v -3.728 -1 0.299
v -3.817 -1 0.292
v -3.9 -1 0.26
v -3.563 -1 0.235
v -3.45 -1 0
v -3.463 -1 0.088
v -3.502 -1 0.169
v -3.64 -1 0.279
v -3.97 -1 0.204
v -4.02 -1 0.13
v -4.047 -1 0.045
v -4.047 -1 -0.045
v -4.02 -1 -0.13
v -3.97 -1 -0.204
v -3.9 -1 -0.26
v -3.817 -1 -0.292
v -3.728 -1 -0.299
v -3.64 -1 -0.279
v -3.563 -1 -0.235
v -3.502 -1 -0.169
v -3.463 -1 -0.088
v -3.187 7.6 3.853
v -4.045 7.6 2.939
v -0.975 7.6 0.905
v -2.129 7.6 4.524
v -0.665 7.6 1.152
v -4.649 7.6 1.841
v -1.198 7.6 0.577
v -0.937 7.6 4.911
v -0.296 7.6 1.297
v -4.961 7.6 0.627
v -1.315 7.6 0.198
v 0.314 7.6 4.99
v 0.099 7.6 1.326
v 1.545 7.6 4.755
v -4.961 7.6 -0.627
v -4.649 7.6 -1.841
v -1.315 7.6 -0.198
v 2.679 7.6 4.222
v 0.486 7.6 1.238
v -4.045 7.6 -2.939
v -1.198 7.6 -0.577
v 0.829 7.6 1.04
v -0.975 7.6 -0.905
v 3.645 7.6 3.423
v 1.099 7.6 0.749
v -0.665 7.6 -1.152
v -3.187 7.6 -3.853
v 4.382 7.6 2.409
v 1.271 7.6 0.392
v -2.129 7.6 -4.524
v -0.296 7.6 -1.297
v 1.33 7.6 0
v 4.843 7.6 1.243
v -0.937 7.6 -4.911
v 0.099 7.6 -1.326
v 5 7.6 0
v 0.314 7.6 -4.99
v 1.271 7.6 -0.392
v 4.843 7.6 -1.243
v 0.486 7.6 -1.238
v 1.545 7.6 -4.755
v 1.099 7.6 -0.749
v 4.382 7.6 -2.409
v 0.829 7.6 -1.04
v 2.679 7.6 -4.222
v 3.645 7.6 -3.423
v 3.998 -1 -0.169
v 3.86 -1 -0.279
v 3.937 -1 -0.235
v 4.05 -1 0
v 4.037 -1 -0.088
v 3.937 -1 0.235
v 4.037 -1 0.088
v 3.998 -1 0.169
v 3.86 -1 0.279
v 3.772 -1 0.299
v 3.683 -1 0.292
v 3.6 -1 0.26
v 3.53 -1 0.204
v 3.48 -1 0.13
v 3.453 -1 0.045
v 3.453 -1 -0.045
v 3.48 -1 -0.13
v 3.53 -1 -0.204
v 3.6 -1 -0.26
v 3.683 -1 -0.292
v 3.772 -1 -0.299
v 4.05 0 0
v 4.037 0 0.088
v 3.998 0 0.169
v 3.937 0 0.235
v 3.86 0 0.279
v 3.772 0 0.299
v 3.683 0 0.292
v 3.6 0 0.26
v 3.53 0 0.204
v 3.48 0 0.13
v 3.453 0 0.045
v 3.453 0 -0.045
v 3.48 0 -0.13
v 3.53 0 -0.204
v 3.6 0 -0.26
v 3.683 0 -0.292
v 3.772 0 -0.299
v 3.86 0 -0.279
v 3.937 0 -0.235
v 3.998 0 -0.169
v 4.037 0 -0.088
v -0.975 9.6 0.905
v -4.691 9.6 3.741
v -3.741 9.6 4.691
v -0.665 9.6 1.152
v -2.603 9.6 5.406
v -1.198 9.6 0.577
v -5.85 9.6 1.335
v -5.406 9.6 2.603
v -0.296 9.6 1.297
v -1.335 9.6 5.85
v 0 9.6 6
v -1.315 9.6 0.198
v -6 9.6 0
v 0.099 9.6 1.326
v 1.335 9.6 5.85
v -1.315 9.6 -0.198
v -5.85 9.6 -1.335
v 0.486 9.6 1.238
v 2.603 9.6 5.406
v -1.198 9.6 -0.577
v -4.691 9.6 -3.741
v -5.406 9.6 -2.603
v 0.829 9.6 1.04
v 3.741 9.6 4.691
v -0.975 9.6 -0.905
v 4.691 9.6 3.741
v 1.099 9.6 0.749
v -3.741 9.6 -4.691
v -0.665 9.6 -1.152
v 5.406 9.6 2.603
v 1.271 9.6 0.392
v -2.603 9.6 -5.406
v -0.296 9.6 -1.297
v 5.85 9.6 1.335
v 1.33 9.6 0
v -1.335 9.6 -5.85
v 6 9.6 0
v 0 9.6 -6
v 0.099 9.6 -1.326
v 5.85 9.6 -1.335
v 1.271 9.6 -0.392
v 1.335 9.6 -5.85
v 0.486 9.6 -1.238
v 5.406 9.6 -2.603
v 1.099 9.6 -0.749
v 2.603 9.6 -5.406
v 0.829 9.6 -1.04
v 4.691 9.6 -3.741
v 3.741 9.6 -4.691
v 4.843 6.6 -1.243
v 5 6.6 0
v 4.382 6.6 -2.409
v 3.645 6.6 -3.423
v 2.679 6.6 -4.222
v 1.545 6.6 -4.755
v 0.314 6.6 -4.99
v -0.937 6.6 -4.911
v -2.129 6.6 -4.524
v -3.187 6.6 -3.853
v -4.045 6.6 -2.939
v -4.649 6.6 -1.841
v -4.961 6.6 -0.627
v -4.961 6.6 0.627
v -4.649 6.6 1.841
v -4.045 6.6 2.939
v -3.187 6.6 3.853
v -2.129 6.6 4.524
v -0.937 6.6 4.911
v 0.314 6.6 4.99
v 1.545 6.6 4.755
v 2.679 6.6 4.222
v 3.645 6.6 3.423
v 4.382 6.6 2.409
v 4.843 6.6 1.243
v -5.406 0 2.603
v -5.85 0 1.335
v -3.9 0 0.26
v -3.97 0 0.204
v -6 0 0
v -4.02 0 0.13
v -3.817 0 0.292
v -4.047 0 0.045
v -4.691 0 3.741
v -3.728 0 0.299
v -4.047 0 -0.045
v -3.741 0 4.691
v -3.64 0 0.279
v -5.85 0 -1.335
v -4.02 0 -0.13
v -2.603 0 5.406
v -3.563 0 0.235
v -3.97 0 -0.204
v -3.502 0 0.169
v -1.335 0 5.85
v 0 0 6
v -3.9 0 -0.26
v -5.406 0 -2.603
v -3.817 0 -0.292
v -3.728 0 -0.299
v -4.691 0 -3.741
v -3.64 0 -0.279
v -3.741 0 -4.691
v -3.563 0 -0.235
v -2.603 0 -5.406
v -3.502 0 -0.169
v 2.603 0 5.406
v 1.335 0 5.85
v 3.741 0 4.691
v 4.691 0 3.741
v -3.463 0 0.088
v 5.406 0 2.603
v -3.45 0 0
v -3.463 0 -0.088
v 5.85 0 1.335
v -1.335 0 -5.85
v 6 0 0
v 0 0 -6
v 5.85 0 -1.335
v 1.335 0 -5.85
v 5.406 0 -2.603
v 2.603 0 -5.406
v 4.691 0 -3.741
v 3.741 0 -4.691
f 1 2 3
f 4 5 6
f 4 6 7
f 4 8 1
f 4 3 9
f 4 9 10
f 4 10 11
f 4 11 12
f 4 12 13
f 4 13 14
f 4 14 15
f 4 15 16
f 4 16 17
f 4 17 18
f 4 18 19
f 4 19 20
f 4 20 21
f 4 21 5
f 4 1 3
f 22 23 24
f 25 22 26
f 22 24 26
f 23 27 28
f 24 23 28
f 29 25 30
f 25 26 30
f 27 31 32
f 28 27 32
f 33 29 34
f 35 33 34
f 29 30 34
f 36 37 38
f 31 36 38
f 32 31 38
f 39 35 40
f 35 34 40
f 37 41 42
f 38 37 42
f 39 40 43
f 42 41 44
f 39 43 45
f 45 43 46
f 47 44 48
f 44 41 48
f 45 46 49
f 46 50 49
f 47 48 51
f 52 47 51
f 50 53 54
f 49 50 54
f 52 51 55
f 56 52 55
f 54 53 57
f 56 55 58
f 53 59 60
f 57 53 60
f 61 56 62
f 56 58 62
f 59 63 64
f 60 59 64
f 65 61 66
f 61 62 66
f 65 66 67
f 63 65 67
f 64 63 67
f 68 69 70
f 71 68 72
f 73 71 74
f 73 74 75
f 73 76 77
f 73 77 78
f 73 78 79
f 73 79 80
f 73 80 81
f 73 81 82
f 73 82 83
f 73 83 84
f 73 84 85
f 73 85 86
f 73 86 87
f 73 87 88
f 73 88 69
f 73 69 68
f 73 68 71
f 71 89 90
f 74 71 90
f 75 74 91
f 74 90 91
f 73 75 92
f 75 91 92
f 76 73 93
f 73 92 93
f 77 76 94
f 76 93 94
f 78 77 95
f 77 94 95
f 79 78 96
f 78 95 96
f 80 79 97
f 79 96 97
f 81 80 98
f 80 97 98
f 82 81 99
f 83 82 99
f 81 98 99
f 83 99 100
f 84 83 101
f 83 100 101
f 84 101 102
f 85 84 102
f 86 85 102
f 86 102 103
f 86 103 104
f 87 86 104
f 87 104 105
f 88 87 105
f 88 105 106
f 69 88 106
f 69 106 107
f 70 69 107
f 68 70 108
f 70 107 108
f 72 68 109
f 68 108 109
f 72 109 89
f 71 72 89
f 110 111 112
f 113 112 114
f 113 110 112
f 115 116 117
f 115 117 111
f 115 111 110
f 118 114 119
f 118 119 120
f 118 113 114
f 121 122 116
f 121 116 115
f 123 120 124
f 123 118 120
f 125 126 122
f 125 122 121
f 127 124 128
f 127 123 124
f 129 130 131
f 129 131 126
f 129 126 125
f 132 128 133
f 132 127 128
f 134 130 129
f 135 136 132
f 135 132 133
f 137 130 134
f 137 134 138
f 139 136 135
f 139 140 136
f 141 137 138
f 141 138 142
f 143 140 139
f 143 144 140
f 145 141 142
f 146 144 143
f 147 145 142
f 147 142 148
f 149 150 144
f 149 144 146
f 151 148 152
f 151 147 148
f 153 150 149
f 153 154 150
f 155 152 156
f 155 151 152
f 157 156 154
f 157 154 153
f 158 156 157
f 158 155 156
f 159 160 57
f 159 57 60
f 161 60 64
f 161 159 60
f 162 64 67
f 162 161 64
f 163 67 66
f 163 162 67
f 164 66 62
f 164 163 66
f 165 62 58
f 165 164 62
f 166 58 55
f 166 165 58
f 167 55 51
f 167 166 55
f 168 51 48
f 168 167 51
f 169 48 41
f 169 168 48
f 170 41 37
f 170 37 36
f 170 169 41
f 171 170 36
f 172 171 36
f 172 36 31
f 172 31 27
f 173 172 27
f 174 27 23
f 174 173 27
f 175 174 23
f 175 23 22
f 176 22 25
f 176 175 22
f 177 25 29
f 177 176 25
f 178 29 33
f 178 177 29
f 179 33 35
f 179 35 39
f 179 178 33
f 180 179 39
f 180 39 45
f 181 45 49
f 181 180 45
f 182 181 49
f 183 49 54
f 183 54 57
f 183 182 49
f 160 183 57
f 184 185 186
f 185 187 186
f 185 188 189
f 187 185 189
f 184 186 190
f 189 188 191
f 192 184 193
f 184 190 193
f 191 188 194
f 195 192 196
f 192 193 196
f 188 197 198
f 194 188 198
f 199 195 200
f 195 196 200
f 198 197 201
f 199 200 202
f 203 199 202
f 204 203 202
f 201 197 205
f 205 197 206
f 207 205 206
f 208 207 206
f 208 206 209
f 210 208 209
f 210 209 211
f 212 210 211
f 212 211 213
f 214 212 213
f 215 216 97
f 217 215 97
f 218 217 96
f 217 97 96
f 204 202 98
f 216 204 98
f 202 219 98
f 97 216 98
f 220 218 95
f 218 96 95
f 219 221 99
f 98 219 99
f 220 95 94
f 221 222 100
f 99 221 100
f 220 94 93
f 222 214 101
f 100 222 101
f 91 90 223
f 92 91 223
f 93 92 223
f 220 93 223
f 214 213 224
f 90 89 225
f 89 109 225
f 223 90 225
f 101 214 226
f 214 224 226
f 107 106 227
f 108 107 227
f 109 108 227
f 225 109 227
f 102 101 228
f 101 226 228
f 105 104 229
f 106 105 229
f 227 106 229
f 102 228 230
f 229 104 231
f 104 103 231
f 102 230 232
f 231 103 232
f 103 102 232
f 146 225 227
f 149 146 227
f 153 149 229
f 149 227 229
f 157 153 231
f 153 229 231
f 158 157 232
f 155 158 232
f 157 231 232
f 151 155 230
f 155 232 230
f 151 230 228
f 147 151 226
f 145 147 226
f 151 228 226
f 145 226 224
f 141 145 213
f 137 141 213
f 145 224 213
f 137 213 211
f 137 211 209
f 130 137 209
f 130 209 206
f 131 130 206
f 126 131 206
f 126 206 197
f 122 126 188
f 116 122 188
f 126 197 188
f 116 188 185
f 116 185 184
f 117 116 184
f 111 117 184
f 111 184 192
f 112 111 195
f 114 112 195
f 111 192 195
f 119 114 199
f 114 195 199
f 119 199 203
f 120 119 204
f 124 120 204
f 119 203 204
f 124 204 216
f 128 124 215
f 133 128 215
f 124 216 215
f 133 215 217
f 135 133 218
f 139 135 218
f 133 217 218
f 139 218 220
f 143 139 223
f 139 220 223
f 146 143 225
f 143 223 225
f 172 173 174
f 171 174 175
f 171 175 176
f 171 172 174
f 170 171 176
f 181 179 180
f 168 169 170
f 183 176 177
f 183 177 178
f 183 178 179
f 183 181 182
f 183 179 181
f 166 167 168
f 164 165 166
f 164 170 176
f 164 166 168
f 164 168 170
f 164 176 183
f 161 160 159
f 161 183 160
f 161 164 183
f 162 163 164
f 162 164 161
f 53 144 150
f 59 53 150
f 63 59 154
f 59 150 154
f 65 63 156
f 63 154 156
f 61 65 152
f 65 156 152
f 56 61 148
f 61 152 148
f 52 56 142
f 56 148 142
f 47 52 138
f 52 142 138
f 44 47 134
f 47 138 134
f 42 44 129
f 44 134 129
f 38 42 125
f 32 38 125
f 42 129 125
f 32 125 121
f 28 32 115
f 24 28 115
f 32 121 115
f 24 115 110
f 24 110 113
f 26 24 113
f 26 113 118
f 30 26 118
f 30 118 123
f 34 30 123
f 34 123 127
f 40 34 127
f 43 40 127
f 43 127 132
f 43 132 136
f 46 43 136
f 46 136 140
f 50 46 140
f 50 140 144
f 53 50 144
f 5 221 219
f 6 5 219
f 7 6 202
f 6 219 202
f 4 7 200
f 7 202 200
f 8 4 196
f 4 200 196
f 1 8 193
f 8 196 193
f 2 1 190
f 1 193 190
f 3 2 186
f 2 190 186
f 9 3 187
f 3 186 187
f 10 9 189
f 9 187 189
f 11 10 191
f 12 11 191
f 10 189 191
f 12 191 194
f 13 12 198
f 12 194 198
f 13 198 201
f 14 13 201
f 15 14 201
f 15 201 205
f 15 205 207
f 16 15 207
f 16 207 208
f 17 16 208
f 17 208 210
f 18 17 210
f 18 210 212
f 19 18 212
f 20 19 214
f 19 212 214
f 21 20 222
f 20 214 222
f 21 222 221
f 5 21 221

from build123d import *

# Parameters (mm, degrees)
SKETCH1_R           = 6
BOSS_EXTRUDE1_DEPTH = 9.6
SKETCH2_R           = 1.33
CUT_EXTRUDE1_DEPTH  = 3
SKETCH3_R           = 5
CUT_EXTRUDE2_DEPTH  = 1
SKETCH4_R           = 0.3
BOSS_EXTRUDE2_DEPTH = 1


with BuildPart() as part:
    # Sketch1 → Boss-Extrude1 (new body)
    with BuildSketch(Plane(origin=(0, 0, 0), x_dir=(1, 0, 0), z_dir=(0, 1, 0))):
        Circle(SKETCH1_R)
    extrude(amount=BOSS_EXTRUDE1_DEPTH)

    # Sketch2 → Cut-Extrude1 (cut)
    with BuildSketch(Plane(origin=(0, 9.6, 0), x_dir=(1, 0, 0), z_dir=(0, 1, 0))):
        Circle(SKETCH2_R)
    extrude(amount=-CUT_EXTRUDE1_DEPTH, mode=Mode.SUBTRACT)

    # Sketch3 → Cut-Extrude2 (cut)
    with BuildSketch(Plane(origin=(0, 6.6, 0), x_dir=(1, 0, 0), z_dir=(0, 1, 0))):
        Circle(SKETCH3_R)
    extrude(amount=CUT_EXTRUDE2_DEPTH, mode=Mode.SUBTRACT)

    # Sketch4 → Boss-Extrude2 (add)
    with BuildSketch(Plane.XZ):
        with Locations((-3.75, 0)):
            Circle(SKETCH4_R)
        with Locations((3.75, 0)):
            Circle(SKETCH4_R)
    extrude(amount=BOSS_EXTRUDE2_DEPTH)


solid = part.part
